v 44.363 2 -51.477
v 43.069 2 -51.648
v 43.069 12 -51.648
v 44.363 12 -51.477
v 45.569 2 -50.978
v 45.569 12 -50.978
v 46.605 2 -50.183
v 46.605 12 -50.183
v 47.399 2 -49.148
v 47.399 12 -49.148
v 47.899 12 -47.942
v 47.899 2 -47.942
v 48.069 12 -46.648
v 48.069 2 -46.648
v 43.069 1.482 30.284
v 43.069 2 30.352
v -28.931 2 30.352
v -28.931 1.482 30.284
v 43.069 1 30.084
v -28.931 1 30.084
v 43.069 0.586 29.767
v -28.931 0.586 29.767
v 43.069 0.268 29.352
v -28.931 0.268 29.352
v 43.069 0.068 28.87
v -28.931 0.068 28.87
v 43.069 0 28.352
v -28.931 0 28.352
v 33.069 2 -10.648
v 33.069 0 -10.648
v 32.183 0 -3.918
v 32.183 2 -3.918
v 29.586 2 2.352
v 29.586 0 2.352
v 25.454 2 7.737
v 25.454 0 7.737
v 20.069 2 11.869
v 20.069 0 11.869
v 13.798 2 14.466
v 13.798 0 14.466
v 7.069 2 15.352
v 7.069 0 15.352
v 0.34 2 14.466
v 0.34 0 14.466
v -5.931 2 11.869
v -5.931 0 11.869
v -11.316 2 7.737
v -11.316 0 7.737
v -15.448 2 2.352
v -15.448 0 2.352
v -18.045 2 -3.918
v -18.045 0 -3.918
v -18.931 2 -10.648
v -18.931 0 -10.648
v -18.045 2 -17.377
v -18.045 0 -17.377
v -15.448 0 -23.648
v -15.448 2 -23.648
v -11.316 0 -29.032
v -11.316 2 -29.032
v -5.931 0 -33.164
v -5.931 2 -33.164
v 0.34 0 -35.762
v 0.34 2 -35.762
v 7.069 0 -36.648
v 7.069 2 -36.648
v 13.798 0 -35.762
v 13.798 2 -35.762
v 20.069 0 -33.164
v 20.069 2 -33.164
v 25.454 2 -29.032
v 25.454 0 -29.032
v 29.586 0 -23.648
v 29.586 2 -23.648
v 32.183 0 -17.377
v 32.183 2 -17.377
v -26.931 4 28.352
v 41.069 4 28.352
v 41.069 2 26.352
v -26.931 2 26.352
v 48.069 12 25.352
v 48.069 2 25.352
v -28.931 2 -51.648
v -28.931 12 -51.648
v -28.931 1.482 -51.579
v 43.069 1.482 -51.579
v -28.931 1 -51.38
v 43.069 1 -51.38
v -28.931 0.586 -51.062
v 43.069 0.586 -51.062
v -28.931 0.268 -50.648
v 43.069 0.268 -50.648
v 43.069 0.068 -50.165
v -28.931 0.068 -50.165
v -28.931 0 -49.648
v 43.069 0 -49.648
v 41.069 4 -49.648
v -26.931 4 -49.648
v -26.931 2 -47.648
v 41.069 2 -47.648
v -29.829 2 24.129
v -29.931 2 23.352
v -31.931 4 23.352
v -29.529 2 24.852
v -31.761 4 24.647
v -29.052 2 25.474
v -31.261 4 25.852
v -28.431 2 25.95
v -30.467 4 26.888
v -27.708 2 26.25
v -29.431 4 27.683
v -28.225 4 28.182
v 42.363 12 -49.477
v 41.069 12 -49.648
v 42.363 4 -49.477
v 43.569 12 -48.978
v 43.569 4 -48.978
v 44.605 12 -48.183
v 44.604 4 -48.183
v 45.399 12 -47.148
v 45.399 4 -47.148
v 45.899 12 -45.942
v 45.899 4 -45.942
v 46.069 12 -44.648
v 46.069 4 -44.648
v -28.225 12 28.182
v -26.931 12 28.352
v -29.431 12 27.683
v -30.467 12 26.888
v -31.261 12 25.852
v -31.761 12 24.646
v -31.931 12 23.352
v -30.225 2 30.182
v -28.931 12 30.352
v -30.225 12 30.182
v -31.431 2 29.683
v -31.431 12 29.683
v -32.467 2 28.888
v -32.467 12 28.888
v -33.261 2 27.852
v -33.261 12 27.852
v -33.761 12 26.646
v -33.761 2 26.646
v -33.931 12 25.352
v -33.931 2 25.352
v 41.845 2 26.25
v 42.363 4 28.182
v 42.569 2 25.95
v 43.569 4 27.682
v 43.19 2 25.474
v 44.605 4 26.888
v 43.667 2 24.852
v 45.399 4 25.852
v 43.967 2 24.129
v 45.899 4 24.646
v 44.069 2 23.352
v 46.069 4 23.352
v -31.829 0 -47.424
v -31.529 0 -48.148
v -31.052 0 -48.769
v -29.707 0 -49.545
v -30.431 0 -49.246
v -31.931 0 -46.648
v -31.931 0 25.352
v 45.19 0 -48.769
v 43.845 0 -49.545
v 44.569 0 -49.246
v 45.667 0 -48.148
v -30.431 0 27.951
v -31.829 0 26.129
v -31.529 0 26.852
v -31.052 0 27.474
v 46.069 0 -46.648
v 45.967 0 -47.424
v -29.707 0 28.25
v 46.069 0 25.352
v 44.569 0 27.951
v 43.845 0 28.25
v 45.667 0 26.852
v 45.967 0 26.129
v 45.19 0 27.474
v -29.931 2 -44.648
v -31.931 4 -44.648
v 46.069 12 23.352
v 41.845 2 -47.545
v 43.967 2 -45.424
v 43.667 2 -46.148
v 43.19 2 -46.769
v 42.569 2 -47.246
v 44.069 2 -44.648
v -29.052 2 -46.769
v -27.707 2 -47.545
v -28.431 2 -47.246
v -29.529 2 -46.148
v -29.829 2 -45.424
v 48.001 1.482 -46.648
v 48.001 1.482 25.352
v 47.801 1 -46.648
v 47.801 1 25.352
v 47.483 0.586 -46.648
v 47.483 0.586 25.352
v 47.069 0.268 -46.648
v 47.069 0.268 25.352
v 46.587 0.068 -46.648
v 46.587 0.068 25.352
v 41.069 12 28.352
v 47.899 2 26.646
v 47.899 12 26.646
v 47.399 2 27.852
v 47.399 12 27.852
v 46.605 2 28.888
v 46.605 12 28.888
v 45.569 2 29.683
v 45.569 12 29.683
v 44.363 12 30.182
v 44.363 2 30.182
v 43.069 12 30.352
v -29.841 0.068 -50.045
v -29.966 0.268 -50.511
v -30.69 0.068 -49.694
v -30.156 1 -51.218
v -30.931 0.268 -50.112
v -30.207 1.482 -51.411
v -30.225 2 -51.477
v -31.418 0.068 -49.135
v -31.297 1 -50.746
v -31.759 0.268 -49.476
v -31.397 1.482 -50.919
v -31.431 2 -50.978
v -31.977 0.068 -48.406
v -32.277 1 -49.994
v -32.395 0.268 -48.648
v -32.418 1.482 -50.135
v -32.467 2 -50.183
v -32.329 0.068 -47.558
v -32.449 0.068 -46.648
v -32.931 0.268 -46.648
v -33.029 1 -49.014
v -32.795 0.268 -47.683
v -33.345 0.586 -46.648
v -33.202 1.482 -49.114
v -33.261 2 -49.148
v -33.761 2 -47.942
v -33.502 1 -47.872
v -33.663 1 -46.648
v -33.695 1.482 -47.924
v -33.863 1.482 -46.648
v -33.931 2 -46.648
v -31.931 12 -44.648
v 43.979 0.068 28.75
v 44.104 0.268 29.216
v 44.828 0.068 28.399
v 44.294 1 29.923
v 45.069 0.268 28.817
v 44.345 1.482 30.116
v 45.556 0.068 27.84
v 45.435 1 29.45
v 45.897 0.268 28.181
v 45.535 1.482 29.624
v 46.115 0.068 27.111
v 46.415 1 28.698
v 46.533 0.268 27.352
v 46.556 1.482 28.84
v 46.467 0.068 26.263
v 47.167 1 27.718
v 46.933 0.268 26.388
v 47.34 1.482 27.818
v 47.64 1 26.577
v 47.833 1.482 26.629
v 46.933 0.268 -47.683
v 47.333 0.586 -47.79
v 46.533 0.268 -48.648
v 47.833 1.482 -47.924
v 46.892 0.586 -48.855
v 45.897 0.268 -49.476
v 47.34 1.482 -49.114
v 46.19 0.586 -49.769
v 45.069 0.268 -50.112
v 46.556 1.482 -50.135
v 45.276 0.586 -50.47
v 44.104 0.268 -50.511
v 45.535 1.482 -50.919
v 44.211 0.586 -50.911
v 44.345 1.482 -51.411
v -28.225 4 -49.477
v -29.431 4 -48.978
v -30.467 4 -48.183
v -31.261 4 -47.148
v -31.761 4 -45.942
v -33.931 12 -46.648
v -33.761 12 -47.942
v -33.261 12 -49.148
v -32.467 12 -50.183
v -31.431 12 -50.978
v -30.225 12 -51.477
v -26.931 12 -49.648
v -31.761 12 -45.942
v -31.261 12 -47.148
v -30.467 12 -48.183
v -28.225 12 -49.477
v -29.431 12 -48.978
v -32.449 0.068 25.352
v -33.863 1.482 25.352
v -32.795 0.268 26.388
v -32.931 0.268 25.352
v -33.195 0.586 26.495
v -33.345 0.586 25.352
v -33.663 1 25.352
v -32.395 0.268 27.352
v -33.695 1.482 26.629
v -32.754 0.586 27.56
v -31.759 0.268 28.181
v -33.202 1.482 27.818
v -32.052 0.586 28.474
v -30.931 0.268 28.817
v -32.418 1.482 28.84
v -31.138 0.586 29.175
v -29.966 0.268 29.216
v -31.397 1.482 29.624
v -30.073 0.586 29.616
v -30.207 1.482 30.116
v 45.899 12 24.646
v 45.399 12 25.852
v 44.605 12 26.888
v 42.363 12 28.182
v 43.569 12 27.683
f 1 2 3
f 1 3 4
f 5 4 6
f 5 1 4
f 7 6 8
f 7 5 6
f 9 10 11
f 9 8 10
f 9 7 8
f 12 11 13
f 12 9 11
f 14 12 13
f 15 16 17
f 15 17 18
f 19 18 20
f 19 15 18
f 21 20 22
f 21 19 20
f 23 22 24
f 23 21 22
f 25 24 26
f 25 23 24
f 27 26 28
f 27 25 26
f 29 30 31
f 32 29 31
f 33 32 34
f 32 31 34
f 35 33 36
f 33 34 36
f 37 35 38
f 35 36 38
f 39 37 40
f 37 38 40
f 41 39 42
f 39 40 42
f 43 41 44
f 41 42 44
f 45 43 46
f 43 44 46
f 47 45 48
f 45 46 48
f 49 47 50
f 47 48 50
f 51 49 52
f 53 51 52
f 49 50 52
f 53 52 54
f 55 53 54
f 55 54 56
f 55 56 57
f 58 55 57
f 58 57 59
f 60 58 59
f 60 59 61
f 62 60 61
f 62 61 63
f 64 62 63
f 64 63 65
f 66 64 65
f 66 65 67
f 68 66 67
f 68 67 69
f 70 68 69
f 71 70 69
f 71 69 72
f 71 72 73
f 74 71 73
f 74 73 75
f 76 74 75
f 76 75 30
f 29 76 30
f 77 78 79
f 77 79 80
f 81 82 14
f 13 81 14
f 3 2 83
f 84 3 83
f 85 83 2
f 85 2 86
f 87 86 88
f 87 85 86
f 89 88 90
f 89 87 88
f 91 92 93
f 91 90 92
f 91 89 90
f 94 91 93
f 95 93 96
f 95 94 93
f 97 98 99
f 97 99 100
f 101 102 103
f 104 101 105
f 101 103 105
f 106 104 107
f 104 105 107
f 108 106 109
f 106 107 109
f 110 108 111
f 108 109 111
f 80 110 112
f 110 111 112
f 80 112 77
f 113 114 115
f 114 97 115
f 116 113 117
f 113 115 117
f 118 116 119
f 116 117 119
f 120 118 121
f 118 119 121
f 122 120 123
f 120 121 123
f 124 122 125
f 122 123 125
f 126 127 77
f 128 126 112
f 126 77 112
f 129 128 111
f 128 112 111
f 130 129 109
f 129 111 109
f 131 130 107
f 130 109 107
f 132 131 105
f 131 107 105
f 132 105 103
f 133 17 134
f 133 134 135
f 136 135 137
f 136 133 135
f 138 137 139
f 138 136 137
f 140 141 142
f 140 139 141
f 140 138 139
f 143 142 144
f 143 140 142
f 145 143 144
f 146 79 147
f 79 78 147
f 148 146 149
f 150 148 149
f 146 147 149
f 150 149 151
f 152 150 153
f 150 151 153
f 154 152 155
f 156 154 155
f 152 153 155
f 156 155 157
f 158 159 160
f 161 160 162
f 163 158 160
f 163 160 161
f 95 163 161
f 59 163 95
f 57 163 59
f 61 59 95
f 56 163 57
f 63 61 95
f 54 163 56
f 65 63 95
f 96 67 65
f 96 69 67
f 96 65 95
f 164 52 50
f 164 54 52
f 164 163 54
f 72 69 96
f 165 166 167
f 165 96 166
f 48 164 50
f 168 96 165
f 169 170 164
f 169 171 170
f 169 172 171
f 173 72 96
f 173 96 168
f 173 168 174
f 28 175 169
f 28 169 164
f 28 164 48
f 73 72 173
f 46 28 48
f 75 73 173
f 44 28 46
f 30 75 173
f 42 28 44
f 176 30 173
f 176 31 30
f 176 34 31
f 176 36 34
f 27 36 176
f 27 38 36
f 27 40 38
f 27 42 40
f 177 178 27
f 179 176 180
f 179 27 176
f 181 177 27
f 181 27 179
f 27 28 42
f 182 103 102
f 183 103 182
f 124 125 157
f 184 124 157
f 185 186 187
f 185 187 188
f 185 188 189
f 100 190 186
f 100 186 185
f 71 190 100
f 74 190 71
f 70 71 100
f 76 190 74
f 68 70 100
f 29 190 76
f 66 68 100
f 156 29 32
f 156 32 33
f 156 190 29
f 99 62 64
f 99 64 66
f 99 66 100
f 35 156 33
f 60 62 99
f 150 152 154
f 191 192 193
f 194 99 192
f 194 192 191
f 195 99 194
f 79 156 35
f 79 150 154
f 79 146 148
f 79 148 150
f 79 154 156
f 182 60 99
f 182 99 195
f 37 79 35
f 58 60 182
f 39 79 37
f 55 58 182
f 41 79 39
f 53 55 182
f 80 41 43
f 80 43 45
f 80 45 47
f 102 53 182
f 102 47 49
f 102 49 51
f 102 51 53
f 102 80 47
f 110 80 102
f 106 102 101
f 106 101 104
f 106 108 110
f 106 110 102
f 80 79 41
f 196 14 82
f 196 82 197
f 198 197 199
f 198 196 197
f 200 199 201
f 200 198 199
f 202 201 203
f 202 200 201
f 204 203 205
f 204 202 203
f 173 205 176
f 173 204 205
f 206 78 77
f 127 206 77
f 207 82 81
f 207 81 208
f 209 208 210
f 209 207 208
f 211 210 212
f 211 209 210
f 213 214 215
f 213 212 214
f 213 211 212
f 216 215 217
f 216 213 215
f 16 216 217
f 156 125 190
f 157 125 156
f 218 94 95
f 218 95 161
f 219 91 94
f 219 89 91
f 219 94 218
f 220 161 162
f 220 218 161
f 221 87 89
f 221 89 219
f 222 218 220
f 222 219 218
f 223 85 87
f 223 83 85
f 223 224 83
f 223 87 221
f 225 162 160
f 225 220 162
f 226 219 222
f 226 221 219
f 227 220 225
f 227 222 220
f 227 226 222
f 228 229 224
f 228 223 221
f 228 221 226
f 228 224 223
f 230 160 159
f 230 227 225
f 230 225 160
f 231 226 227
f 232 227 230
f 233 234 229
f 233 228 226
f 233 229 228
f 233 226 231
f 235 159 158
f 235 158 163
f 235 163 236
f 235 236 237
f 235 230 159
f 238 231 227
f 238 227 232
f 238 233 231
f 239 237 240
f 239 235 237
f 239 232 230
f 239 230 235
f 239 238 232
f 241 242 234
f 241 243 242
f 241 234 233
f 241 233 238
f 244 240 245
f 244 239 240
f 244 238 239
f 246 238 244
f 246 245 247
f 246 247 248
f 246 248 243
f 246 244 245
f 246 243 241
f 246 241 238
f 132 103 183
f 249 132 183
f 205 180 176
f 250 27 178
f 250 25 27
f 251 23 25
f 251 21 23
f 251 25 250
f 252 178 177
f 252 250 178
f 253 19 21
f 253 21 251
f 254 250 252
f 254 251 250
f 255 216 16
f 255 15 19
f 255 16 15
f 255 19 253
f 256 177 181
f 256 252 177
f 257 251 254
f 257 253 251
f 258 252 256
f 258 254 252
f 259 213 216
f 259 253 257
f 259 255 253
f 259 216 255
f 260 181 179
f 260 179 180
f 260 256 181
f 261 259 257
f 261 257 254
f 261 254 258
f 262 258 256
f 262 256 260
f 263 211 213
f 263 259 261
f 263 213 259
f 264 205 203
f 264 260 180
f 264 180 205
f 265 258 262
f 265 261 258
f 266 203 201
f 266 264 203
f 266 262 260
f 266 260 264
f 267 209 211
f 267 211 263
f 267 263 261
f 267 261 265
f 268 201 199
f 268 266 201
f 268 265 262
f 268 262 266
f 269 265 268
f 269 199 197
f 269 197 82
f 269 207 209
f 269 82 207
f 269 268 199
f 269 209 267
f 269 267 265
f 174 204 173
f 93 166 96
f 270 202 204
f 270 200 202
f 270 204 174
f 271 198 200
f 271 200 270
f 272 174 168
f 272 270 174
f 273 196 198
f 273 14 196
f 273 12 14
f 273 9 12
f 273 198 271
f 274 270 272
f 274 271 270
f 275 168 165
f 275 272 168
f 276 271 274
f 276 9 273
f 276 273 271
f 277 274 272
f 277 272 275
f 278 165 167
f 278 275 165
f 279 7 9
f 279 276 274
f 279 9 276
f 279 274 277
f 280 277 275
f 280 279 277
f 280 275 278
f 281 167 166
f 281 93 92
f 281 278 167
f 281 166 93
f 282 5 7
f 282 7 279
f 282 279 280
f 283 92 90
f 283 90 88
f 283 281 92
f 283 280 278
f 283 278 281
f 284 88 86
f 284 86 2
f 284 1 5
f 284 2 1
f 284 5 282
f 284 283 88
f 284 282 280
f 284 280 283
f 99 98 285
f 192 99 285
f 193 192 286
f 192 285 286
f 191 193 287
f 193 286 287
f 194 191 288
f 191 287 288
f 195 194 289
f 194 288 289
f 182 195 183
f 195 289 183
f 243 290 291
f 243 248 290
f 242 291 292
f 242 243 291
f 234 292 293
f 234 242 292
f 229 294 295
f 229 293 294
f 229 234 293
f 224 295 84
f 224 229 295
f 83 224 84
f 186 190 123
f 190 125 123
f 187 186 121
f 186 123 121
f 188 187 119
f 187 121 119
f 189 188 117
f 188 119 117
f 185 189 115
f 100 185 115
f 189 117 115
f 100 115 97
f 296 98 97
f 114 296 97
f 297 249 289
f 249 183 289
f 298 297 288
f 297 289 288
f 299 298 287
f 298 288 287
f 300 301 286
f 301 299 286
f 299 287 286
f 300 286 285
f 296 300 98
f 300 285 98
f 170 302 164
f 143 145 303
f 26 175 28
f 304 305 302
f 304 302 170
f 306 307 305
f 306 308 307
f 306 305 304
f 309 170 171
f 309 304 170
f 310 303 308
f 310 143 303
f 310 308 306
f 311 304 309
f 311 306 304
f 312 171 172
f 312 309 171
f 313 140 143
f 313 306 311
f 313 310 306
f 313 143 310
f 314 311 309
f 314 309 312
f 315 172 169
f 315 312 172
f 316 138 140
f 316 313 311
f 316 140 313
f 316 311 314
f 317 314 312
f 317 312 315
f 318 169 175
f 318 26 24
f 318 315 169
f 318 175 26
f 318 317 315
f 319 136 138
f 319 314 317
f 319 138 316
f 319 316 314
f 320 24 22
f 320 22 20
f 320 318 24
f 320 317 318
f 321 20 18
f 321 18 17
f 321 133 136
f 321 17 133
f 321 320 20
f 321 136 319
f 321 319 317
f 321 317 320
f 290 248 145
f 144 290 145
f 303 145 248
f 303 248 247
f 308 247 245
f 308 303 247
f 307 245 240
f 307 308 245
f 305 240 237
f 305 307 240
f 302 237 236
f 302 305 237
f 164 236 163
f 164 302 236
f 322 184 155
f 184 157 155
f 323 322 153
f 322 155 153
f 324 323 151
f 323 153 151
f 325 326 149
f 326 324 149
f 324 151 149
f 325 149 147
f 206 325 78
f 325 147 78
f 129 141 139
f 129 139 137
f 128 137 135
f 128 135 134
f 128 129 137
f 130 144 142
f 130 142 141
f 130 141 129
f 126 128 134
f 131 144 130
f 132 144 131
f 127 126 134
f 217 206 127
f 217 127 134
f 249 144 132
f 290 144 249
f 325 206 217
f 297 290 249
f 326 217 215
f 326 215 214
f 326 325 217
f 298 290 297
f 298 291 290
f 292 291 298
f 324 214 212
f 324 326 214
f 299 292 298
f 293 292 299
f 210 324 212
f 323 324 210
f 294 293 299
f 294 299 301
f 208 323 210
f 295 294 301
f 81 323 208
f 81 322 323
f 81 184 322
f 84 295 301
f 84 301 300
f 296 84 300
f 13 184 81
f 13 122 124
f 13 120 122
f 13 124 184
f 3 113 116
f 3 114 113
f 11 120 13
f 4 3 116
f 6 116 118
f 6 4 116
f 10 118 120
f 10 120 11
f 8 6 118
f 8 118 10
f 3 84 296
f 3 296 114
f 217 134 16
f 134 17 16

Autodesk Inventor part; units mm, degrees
ref_plane "YZ Plane" through (0, 0, 0) normal (1, 0, 0) x (0, 1, 0)
ref_plane "XZ Plane" through (0, 0, 0) normal (0, 1, 0) x (-1, 0, 0)
ref_plane "XY Plane" through (0, 0, 0) normal (0, 0, 1) x (1, 0, 0)
sketch "Sketch1" plane through (0, 0, 0) normal (0, 1, 0) x (-1, 0, 0)
  line L0 (28.931, 30.3524) -> (-43.069, 30.3524)
  line L1 (-48.069, 25.3524) -> (-48.069, -51.6476)
  line L2 (-43.069, -51.6476) -> (33.931, -51.6476)
  line L3 (33.931, -46.6476) -> (33.931, 30.3524)
  arc A0 (-48.069, -46.6476) -> (-43.069, -51.6476) centre (-43.069, -46.6476) ccw
  line L4 (-46.069, 28.3524) -> (26.931, 28.3524)
  line L5 (31.931, 23.3524) -> (31.931, -44.6476)
  line L6 (31.931, -49.6476) -> (-46.069, -49.6476)
  line L7 (-46.069, -44.6476) -> (-46.069, 23.3524)
  arc A1 (-38.6778, 27.7435) -> (-45.4601, 20.9612) centre (-41.069, 23.3524) ccw
  arc A2 (24.5399, -49.0388) -> (31.3222, -42.2565) centre (26.931, -44.6476) ccw
  arc A3 (31.3222, 20.9612) -> (24.5399, 27.7435) centre (26.931, 23.3524) ccw
  arc A4 (-45.4601, -42.2565) -> (-38.6778, -49.0388) centre (-41.069, -44.6476) ccw
  arc A5 (33.931, 25.3524) -> (28.931, 30.3524) centre (28.931, 25.3524) ccw
  arc A6 (-46.069, 21.3524) -> (-45.4601, 20.9612) centre (-43.069, 25.3524) ccw
  arc A7 (-43.069, 30.3524) -> (-48.069, 25.3524) centre (-43.069, 25.3524) ccw
  arc A8 (28.931, -51.6476) -> (33.931, -46.6476) centre (28.931, -46.6476) ccw
  point P0 (0, 0)
  point P1 (-41.069, -49.6476)
  point P2 (26.931, -49.6476)
  point P3 (-41.069, 28.3524)
  dimension "d0" = 82
  dimension "d1" = 82
  dimension "d3" = 10
  dimension "d7" = 78
  dimension "d8" = 78
  dimension "d9" = 2
  dimension "d10" = 2
  dimension "d11" = 10
  dimension "d12" = 10
  dimension "d13" = 10
  dimension "d14" = 10
extrude "Extrusion1" add sketch "Sketch1" along normal blind 2 contours L4 A3 L5 A2 L6 A4 L7 A6 A1
extrude "Extrusion2" add sketch "Sketch1" along normal blind 15
sketch "Sketch2" plane through (0, 0, 0) normal (0, -1, 0) x (1, 0, 0)
  line L0 (48.069, 25.3524) -> (48.069, -46.6476) projected
  arc A0 (48.069, 25.3524) -> (43.069, 30.3524) centre (43.069, 25.3524) ccw projected
  line L1 (-28.931, 30.3524) -> (43.069, 30.3524) projected
  arc A1 (-28.931, 30.3524) -> (-33.931, 25.3524) centre (-28.931, 25.3524) ccw projected
  line L2 (-33.931, -46.6476) -> (-33.931, 25.3524) projected
  arc A2 (-33.931, -46.6476) -> (-28.931, -51.6476) centre (-28.931, -46.6476) ccw projected
  line L3 (43.069, -51.6476) -> (-28.931, -51.6476) projected
  arc A3 (43.069, -51.6476) -> (48.069, -46.6476) centre (43.069, -46.6476) ccw projected
  arc A4 (45.4601, 20.9612) -> (46.069, 21.3524) centre (43.069, 25.3524) ccw projected
  arc A5 (45.4601, 20.9612) -> (46.069, 23.3524) centre (41.069, 23.3524) ccw projected
  line L4 (46.069, 21.3524) -> (46.069, 23.3524) projected
  circle A6 centre (7.069, -10.6476) radius 26
  point P0 (0, 0)
  dimension "d19" = 52
extrude "Extrusion3" cut sketch "Sketch2" along normal mid plane 15 contours A6
sketch "Sketch3" plane through (0, 15, 0) normal (0, 1, 0) x (1, 0, 0)
  line L0 (48.069, -25.3524) -> (48.069, 46.6476) projected
  arc A0 (48.069, 46.6476) -> (43.069, 51.6476) centre (43.069, 46.6476) ccw projected
  line L1 (43.069, 51.6476) -> (-28.931, 51.6476) projected
  arc A1 (-28.931, 51.6476) -> (-33.931, 46.6476) centre (-28.931, 46.6476) ccw projected
  line L2 (-33.931, 46.6476) -> (-33.931, -25.3524) projected
  arc A2 (-33.931, -25.3524) -> (-28.931, -30.3524) centre (-28.931, -25.3524) ccw projected
  line L3 (-28.931, -30.3524) -> (43.069, -30.3524) projected
  arc A3 (43.069, -30.3524) -> (48.069, -25.3524) centre (43.069, -25.3524) ccw projected
  arc A4 (46.069, 44.6476) -> (41.069, 49.6476) centre (41.069, 44.6476) ccw projected
  line L4 (46.069, 44.6476) -> (46.069, -23.3524) projected
  arc A5 (41.069, -28.3524) -> (46.069, -23.3524) centre (41.069, -23.3524) ccw projected
  line L5 (41.069, -28.3524) -> (-26.931, -28.3524) projected
  arc A6 (-31.931, -23.3524) -> (-26.931, -28.3524) centre (-26.931, -23.3524) ccw projected
  line L6 (-31.931, -23.3524) -> (-31.931, 44.6476) projected
  arc A7 (-26.931, 49.6476) -> (-31.931, 44.6476) centre (-26.931, 44.6476) ccw projected
  line L7 (-26.931, 49.6476) -> (41.069, 49.6476) projected
  point P0 (0, 0)
extrude "Extrusion4" cut sketch "Sketch3" against normal blind 3
fillet "Fillet1" radius 2 8 edges at (7.069, 0, -51.6476) (-32.4666, 0, -50.1832) (-33.931, 0, -10.6476) (-32.4666, 0, 28.8879) (7.069, 0, 30.3524) (46.6045, 0, 28.8879) (48.069, 0, -10.6476) (46.6045, 0, -50.1832)
sketch "Sketch4" plane through (0, 0, 0) normal (0, -1, 0) x (1, 0, 0)
  line L0 (46.069, 21.3524) -> (46.069, -46.6476) projected
  arc A0 (45.4601, 20.9612) -> (46.069, 21.3524) centre (43.069, 25.3524) ccw projected
  arc A1 (45.4601, 20.9612) -> (46.069, 23.3524) centre (41.069, 23.3524) ccw projected
  line L1 (46.069, 25.3524) -> (46.069, 23.3524) projected
  arc A2 (46.069, 25.3524) -> (43.069, 28.3524) centre (43.069, 25.3524) ccw projected
  line L2 (-28.931, 28.3524) -> (43.069, 28.3524) projected
  arc A3 (-28.931, 28.3524) -> (-31.931, 25.3524) centre (-28.931, 25.3524) ccw projected
  line L3 (-31.931, -46.6476) -> (-31.931, 25.3524) projected
  arc A4 (-31.931, -46.6476) -> (-28.931, -49.6476) centre (-28.931, -46.6476) ccw projected
  line L4 (43.069, -49.6476) -> (-28.931, -49.6476) projected
  arc A5 (43.069, -49.6476) -> (46.069, -46.6476) centre (43.069, -46.6476) ccw projected
  circle A6 centre (7.069, -10.6476) radius 26 projected
  line L5 (46.069, 23.3524) -> (46.069, -44.6476) projected
  line L6 (46.069, 21.3524) -> (46.069, 23.3524)
  point P0 (0, 0)
extrude "Extrusion5" add sketch "Sketch4" against normal blind 2 contours A0 A1 L5
chamfer "Chamfer1" distance 2 angle 45 8 edges at (46.069, 2, -10.6476) (44.6045, 2, 26.8879) (7.069, 2, 28.3524) (-30.4666, 2, 26.8879) (-31.931, 2, -10.6476) (-30.4666, 2, -48.1832) (7.069, 2, -49.6476) (44.6045, 2, -48.1832)
properties part number "controler_03"
